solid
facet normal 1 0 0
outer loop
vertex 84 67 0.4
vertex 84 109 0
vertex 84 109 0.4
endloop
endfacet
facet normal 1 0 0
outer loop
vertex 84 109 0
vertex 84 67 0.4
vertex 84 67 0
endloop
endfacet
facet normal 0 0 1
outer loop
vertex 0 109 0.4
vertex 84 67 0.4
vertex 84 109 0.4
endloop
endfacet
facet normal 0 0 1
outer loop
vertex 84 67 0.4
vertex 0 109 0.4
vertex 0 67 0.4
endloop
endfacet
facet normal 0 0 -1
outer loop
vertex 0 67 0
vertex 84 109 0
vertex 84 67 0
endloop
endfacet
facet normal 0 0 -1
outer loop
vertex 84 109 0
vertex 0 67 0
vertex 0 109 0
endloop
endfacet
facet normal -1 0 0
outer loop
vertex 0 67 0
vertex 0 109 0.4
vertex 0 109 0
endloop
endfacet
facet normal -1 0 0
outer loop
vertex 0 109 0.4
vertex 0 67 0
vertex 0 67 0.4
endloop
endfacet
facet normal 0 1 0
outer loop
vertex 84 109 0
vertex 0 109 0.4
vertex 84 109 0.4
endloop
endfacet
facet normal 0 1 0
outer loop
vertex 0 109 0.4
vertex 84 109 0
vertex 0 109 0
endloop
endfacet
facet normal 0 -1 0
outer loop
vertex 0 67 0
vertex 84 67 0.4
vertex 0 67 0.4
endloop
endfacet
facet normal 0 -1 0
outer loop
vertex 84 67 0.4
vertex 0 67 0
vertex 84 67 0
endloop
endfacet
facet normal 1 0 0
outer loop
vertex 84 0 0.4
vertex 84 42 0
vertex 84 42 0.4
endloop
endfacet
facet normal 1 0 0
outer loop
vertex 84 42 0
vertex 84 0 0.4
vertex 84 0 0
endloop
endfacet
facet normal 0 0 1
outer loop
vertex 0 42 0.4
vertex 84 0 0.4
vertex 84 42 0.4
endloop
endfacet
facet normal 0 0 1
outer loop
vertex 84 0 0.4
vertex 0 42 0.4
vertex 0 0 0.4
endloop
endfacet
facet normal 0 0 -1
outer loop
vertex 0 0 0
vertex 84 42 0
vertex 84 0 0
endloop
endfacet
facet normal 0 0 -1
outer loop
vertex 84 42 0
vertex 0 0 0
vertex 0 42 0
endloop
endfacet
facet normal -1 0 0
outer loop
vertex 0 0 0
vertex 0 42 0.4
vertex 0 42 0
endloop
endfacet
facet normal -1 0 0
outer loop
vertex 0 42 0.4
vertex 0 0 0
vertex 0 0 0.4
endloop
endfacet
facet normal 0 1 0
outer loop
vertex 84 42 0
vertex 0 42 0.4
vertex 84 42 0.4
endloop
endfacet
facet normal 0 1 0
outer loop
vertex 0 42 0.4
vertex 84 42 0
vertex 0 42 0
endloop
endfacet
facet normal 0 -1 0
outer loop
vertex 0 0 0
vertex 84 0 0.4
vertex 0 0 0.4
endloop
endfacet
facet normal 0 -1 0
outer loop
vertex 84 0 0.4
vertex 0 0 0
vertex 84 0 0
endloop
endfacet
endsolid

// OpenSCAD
//
// PARAMETRIC DISHWASHER SIGN PLATES
//
// Colored plates for Bergeron720's dishwasher sign https://makerworld.com/en/models/965214-clean-dirty-dishwasher-sign?from=search#profileId-935601
//
// Author: RobotAnna
// https://www.printables.com/@RobotAnna
// CC Public Domain



// PARAMETERS
text1 =  "Clean";  // text for sign 1
text2 =  "Dirty";  // text for sign 2
fontname = "Trebuchet MS:style=Bold";
textsize = 22;


// CONSTANTS
width = 84;
depth  = 42;
height =  0.4;  // Bergeron720's design allows for max 1mm plates, so I suggest you keep the height to 0.8mm. That is: 2x 0.2mm layers of the color, and 2x 0.2mm layers of the text



// DERIVED



// MODULES



// PUT IT ALL TOGETHER
// colors are not necessary, this just helps to debug the code

color("Green")
translate([0,depth + 25,0])
cube([width, depth, height]);
color("White")
translate([width/2, depth + 25 + depth/2, 0.8])
text(text1, size=textsize, font=fontname, valign="center", halign="center");

color("Red")
translate([0,0,0])
cube([width, depth, height]);
color("White")
translate([width/2, depth/2, 0.8])
text(text2, size=textsize, font=fontname, valign="center", halign="center");
